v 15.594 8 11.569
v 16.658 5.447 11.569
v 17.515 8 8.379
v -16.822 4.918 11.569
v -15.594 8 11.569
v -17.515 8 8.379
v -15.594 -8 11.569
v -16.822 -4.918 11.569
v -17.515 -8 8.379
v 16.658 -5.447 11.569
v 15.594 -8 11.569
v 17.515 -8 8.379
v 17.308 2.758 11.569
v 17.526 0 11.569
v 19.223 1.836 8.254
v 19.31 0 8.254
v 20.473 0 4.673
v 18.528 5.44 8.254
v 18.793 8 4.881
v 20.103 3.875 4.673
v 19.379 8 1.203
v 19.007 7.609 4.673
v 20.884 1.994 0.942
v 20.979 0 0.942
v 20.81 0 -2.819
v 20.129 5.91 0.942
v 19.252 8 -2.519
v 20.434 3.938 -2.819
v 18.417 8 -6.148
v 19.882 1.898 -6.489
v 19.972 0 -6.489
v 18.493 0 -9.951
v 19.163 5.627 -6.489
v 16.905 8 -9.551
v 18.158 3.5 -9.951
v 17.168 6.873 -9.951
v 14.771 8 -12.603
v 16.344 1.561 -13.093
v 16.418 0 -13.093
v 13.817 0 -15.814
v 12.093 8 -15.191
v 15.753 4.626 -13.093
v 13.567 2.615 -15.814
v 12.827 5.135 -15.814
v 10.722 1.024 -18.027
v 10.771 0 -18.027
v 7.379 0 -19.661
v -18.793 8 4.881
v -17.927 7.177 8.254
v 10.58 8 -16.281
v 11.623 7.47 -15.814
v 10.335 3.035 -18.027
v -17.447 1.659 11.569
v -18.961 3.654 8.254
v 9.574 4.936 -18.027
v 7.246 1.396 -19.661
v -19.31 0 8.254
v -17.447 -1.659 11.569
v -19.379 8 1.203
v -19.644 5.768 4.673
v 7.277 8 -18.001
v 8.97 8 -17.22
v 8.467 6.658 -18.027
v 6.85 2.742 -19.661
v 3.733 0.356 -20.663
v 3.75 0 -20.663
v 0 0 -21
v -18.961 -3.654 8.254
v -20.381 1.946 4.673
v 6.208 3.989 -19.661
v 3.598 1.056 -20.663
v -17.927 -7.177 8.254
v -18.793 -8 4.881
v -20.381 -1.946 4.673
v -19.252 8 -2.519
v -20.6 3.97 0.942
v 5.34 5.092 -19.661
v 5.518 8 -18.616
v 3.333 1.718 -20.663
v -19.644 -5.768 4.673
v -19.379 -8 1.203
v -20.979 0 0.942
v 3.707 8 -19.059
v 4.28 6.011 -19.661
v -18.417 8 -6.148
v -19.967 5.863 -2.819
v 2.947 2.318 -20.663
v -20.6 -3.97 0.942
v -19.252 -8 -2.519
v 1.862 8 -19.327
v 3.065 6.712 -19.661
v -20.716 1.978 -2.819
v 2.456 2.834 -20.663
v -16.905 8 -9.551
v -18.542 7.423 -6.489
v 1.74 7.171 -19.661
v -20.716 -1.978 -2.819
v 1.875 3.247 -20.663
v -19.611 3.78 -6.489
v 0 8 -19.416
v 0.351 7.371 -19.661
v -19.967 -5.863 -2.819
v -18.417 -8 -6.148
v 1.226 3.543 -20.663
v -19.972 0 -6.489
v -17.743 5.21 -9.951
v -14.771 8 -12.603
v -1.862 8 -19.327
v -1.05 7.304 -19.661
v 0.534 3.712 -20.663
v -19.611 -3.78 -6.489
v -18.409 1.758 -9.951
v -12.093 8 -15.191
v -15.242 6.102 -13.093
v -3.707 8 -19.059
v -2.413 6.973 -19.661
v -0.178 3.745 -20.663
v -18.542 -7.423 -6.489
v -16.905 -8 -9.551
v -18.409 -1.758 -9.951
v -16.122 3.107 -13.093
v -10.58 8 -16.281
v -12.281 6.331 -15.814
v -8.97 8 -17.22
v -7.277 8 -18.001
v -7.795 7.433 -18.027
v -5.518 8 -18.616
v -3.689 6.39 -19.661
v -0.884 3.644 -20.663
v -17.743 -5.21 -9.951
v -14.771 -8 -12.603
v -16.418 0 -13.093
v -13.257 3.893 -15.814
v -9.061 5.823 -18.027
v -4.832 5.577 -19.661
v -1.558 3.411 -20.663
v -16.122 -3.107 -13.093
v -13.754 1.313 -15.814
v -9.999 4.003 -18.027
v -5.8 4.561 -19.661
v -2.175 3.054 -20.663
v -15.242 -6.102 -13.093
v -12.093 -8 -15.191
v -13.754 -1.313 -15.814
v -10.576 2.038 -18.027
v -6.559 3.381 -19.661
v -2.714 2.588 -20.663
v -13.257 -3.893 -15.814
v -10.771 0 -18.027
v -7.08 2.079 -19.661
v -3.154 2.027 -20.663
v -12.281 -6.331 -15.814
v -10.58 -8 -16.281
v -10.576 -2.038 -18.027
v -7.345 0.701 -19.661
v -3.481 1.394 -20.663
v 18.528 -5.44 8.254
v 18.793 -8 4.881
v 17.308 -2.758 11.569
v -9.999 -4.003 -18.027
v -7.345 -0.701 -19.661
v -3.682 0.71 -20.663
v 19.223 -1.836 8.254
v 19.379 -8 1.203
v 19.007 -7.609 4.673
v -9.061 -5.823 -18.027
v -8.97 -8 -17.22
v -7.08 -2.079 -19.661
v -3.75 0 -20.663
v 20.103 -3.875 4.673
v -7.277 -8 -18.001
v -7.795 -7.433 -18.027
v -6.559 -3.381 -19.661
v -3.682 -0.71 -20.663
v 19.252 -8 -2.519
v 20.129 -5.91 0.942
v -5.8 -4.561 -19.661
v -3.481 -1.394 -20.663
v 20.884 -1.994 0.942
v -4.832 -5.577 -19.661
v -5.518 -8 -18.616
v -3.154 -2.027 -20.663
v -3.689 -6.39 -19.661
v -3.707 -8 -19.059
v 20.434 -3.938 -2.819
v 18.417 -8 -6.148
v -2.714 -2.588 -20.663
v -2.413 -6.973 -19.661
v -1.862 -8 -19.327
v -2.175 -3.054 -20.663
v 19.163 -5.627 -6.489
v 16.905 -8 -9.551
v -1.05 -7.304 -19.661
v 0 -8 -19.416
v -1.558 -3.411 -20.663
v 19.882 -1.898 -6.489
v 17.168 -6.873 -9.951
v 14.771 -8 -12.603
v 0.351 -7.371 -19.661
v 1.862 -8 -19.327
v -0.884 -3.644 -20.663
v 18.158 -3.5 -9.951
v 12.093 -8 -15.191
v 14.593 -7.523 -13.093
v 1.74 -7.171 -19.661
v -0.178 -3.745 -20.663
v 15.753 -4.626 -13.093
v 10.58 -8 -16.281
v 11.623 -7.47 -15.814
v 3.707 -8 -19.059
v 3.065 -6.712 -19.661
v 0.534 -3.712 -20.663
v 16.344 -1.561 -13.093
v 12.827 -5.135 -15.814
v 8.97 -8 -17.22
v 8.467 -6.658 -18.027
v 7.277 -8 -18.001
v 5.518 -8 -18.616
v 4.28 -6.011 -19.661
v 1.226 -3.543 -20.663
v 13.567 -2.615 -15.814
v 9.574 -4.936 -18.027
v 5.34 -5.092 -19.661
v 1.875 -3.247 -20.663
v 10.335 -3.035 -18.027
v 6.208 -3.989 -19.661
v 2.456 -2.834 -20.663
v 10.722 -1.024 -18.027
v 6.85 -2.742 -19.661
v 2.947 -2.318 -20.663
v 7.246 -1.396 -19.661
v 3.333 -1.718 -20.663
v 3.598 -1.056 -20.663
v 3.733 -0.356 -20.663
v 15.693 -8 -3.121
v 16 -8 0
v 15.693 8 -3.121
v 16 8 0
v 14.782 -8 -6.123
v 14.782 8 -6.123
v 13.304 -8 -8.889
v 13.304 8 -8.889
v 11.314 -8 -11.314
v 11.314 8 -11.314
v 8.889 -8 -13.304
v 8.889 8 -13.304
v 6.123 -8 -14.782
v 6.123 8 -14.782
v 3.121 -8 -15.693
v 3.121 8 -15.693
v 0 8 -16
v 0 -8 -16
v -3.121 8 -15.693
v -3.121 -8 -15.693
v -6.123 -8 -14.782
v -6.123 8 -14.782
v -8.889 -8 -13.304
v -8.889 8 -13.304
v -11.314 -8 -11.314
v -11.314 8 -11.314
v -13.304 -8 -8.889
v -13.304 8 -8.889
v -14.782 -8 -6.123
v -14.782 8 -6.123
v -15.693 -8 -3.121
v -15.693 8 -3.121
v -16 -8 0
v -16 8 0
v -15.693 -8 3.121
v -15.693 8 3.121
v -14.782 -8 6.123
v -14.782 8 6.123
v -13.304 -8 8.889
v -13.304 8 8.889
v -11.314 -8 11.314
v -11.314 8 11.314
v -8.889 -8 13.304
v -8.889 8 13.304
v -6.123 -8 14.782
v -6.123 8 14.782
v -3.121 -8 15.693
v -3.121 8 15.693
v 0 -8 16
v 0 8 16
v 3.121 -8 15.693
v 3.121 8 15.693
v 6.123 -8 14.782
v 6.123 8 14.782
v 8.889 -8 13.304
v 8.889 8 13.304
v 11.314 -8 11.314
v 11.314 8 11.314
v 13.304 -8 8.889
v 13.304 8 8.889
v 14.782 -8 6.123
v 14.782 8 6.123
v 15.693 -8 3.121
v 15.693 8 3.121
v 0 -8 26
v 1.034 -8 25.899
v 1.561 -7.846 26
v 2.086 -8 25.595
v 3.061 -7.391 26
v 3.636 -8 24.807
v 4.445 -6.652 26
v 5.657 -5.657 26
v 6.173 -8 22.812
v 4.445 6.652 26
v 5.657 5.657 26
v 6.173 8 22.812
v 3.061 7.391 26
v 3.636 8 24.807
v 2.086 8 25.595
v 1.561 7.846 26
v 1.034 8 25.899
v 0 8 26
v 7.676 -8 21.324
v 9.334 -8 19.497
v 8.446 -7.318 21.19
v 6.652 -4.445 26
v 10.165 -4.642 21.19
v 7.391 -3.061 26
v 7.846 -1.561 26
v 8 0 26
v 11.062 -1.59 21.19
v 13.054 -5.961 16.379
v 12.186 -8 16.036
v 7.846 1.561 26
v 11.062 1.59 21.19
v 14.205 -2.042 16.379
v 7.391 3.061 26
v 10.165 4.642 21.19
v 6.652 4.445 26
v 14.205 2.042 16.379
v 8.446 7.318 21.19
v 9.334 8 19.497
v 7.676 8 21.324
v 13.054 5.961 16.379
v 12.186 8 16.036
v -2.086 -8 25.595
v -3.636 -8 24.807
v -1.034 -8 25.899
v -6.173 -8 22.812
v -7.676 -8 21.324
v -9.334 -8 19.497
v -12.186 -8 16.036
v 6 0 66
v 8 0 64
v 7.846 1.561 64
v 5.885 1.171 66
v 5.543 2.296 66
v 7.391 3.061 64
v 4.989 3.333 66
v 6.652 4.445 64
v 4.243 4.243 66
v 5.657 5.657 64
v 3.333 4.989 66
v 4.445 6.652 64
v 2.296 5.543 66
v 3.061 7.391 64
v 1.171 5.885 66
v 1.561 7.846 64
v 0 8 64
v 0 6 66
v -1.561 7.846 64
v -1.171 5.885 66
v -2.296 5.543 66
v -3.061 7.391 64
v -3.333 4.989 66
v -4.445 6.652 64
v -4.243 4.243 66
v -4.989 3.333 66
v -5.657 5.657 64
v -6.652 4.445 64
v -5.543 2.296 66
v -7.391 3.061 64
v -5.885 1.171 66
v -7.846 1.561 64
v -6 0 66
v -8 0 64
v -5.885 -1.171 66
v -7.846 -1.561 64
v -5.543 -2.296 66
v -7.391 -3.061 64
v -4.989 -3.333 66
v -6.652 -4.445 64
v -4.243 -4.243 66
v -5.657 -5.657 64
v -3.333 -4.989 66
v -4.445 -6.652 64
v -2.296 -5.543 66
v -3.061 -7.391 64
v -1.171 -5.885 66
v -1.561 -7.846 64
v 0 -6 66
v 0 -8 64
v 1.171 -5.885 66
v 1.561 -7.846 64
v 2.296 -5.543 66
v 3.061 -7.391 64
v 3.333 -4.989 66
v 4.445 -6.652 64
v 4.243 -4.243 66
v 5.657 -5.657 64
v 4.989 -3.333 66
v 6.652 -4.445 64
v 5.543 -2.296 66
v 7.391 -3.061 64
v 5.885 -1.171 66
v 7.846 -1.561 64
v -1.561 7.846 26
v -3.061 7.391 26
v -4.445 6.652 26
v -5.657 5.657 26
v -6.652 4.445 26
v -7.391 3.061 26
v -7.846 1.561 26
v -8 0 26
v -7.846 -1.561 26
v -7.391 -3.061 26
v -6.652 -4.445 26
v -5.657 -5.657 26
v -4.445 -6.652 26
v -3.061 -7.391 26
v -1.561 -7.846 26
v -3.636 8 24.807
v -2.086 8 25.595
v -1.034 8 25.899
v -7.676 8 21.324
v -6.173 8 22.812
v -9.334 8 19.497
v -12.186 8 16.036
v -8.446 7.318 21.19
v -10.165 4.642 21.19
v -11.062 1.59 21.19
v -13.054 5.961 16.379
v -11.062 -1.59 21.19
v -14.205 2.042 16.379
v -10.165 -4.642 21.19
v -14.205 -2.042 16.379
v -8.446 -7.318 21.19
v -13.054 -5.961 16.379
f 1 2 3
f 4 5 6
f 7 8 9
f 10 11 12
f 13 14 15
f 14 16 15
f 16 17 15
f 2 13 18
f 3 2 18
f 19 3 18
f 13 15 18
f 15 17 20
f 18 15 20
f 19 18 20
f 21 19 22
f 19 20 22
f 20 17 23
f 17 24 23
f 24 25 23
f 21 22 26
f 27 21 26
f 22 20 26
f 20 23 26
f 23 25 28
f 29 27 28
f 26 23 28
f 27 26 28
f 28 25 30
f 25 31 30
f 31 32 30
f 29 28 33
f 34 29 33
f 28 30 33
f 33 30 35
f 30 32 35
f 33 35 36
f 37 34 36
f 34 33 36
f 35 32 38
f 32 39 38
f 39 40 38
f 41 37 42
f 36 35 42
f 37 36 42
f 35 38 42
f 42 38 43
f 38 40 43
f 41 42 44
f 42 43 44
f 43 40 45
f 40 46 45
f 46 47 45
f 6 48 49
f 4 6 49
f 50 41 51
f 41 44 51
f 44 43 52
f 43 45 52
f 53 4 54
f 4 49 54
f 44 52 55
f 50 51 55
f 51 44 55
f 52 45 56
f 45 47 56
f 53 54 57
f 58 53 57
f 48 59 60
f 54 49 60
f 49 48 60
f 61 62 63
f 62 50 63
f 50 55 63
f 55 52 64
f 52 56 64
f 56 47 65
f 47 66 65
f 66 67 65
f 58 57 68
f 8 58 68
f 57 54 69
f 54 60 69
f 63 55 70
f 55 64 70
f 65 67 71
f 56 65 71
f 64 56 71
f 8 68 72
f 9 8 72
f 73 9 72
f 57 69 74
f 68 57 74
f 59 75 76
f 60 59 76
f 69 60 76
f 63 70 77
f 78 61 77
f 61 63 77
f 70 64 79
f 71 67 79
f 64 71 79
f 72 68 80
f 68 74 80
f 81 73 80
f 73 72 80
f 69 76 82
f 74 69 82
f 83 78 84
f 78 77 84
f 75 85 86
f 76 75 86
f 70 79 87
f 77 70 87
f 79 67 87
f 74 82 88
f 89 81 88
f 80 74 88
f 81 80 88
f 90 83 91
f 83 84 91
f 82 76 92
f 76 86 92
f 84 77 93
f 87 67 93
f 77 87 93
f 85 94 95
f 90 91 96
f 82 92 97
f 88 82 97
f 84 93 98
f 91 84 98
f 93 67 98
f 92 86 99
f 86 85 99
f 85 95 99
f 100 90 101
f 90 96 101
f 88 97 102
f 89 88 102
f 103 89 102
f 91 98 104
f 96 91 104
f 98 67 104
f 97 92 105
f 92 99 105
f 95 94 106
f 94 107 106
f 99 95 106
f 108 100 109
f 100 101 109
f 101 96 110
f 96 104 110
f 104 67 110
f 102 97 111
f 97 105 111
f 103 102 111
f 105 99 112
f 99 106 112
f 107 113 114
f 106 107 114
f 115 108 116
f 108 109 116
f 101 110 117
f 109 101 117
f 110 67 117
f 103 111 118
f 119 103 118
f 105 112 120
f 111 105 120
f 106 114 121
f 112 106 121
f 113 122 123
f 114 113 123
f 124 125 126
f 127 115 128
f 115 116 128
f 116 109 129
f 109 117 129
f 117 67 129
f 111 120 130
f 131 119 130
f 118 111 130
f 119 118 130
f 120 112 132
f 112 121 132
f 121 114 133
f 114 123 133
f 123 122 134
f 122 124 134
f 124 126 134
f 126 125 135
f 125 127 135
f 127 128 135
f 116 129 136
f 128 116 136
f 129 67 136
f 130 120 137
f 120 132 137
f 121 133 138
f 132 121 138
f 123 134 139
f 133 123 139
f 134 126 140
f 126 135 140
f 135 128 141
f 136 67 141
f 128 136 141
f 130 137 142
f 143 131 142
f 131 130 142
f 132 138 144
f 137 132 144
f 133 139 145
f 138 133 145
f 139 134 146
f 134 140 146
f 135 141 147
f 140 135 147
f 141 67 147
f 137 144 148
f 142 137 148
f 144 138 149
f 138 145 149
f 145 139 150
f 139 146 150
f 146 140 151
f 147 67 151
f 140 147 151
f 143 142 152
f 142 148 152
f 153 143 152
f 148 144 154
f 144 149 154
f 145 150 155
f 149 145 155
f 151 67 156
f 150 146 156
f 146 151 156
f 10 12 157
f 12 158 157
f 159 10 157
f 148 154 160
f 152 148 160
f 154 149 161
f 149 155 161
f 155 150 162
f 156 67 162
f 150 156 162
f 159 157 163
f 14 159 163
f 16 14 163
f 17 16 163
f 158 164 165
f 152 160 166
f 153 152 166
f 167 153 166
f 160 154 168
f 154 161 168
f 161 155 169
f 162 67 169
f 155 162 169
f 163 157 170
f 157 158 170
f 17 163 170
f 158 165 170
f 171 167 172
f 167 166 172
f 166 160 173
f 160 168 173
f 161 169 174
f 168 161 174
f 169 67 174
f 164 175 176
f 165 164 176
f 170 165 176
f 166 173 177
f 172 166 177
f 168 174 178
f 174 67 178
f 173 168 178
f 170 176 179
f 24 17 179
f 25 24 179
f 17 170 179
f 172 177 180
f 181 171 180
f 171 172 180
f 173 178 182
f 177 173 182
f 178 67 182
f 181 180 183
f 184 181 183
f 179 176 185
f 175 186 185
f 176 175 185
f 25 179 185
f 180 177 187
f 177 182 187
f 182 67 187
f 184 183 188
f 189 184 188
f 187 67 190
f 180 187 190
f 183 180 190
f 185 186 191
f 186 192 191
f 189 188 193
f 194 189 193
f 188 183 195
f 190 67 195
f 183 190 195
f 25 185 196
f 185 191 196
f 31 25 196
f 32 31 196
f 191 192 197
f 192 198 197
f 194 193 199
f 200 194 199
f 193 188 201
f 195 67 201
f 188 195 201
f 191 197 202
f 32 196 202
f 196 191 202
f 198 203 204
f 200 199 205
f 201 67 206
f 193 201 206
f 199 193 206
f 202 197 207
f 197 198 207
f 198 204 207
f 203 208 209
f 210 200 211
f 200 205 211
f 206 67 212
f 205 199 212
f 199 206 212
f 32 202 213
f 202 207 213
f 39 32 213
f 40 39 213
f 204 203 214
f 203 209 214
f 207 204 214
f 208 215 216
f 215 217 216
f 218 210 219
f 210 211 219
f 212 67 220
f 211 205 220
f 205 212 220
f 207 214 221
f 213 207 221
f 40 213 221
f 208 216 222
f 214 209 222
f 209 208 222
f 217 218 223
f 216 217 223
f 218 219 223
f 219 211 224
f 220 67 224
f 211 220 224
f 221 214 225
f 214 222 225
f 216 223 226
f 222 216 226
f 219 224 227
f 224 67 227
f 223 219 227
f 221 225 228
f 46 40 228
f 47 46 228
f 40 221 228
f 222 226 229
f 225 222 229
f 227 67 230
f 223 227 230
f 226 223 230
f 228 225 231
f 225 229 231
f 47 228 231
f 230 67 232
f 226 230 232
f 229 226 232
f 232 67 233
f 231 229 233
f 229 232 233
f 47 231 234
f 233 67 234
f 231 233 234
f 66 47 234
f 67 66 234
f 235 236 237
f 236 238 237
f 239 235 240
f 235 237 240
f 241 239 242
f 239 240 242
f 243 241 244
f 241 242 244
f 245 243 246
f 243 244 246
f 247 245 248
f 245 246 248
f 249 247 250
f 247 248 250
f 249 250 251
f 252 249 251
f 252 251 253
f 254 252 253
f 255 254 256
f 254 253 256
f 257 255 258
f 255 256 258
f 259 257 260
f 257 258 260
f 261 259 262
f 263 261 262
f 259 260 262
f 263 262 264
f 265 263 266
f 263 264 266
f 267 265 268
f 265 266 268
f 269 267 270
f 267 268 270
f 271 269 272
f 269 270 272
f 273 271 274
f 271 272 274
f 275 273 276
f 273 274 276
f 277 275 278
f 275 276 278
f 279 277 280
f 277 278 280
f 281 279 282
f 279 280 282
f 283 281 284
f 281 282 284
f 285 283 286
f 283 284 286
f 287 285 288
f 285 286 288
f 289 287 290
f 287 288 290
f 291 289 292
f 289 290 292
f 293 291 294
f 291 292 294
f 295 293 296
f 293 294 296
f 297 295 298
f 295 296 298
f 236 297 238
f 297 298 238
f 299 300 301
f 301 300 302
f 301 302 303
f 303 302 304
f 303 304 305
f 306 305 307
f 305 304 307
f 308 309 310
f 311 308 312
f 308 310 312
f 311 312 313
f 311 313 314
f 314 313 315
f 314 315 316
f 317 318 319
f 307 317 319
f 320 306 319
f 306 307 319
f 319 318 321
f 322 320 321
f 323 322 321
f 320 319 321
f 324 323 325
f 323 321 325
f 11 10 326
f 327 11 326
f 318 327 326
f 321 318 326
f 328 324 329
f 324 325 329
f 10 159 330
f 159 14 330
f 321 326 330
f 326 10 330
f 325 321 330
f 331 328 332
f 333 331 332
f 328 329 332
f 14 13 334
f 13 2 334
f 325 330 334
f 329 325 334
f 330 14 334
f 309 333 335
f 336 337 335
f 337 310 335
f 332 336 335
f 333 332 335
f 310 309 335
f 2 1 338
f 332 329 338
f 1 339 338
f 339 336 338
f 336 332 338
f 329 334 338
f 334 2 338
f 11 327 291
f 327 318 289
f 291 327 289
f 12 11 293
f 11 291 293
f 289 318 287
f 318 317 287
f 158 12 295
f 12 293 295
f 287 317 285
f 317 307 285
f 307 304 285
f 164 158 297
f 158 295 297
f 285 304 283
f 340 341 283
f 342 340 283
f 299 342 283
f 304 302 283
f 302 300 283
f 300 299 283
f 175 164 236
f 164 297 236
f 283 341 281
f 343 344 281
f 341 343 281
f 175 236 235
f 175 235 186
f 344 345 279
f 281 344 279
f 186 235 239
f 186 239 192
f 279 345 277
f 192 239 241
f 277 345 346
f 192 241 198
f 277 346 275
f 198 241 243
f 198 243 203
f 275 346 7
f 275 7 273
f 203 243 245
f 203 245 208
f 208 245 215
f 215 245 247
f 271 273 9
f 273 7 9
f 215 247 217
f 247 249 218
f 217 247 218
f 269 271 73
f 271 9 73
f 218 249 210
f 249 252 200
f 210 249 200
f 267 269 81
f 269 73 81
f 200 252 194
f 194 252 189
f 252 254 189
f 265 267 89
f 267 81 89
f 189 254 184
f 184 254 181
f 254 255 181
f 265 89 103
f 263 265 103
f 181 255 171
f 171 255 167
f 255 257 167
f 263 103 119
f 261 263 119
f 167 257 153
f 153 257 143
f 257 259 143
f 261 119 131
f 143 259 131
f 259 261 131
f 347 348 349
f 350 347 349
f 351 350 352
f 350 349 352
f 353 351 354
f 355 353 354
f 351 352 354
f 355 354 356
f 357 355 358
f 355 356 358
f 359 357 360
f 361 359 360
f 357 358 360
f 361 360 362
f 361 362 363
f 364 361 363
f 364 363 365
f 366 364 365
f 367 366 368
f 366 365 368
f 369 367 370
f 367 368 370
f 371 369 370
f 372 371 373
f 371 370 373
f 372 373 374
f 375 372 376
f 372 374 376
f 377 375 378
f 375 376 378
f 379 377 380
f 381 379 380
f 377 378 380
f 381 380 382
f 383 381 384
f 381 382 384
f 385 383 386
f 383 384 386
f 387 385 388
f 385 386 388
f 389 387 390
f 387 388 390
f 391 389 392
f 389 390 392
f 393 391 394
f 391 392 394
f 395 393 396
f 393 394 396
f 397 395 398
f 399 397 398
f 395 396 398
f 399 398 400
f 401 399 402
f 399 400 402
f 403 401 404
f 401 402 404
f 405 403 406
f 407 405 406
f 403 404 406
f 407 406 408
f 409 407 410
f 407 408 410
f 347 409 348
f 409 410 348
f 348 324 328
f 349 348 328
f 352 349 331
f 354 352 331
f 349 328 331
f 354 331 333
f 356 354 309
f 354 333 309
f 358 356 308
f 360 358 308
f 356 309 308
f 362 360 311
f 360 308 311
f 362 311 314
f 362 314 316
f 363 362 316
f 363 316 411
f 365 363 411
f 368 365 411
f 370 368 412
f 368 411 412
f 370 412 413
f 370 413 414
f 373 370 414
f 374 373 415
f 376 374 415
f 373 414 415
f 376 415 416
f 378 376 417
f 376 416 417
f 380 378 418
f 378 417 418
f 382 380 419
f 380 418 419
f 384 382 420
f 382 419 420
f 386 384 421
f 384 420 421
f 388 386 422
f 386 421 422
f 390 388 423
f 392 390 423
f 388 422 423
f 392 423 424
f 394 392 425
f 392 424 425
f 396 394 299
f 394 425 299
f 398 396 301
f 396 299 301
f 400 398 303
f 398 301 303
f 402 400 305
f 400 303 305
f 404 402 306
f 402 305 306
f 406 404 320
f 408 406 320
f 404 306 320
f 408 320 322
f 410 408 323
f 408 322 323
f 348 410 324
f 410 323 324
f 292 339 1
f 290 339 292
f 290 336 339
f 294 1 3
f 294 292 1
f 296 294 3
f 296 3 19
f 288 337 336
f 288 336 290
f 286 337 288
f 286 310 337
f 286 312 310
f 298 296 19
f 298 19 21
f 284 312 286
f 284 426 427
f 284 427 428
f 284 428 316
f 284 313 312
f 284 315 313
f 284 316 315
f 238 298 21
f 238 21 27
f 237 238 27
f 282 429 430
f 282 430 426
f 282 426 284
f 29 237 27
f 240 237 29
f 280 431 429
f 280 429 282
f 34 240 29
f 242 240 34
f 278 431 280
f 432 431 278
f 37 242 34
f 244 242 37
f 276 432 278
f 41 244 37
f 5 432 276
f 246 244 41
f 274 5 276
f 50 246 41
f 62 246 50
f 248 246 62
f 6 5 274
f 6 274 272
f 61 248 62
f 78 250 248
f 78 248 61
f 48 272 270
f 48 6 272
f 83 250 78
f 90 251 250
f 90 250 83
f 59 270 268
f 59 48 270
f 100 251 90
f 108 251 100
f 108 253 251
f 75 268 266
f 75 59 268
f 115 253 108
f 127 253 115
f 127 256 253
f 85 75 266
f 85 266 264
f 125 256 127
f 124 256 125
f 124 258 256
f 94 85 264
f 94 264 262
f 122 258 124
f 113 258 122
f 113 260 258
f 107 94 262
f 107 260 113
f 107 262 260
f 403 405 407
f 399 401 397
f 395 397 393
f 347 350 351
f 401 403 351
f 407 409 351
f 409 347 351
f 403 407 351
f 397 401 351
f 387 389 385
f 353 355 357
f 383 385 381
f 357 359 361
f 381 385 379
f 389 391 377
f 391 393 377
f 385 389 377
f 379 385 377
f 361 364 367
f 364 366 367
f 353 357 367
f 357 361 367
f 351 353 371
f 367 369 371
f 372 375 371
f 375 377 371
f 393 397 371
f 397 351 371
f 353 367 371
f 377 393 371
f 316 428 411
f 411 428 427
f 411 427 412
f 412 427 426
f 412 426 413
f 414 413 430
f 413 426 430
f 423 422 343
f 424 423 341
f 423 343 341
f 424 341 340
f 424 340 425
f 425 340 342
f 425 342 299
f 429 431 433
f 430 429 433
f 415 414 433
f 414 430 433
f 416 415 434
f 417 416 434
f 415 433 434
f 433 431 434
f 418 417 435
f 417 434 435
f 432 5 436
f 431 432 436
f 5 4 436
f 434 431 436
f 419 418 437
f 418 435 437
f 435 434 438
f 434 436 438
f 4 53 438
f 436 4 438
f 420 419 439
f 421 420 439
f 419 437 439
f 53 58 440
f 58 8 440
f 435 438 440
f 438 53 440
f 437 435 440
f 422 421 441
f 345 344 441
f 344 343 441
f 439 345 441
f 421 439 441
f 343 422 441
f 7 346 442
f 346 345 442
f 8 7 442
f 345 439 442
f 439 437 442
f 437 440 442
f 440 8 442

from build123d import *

# Parameters (mm, degrees)
SZKIC1_W                        = 8
SZKIC1_H                        = 40
WYTNIJ_WYCI_GNI_CIE1_DEPTH      = 22
WYTNIJ_WYCI_GNI_CIE1_DEPTH_BACK = 22
SZKIC3_R                        = 16
WYTNIJ_WYCI_GNI_CIE2_DEPTH      = 9
WYTNIJ_WYCI_GNI_CIE2_DEPTH_BACK = 9
SFAZOWANIE1_SIZE                = 2


with BuildPart() as part:
    # Szkic1 → Obrót1 (revolve)
    with BuildSketch(Plane(origin=(0, 0, 0), x_dir=(1, 0, 0), z_dir=(0, 1, 0))):
        with BuildLine():
            Line((0, 21), (0, -26))
            Line((0, -26), (8, -26))
            Line((8, -26), (17.525976473, -11.568930316))
            ThreePointArc((17.525976473, -11.568930316), (18.492532772, 9.951192475), (0, 21))
        make_face()
        with Locations((4, -46)):
            Rectangle(SZKIC1_W, SZKIC1_H)
    revolve(axis=Axis((0, 0, -26.043516498), (0, 0, 1)))

    # Szkic2 → Wytnij-wyciągnięcie1 (cut, two sides)
    with BuildSketch(Plane(origin=(0, 0, 0), x_dir=(0, 0, -1), z_dir=(1, 0, 0))) as wytnij_wyci_gni_cie1_sk:
        with BuildLine():
            Line((-26, 8), (19.416487839, 8))
            ThreePointArc((19.416487839, 8), (6.171069333, 20.072815031), (-11.568930316, 17.525976473))
            Line((-11.568930316, 17.525976473), (-26, 8))
        make_face()
        with BuildLine():
            Line((-26, -8), (19.416487839, -8))
            ThreePointArc((19.416487839, -8), (6.171069333, -20.072815031), (-11.568930316, -17.525976473))
            Line((-11.568930316, -17.525976473), (-26, -8))
        make_face()
    extrude(amount=WYTNIJ_WYCI_GNI_CIE1_DEPTH, mode=Mode.SUBTRACT)
    extrude(wytnij_wyci_gni_cie1_sk.sketch, amount=-WYTNIJ_WYCI_GNI_CIE1_DEPTH_BACK, mode=Mode.SUBTRACT)

    # Szkic3 → Wytnij-wyciągnięcie2 (cut, two sides)
    with BuildSketch(Plane(origin=(0, 0, 0), x_dir=(1, 0, 0), z_dir=(0, 1, 0))) as wytnij_wyci_gni_cie2_sk:
        Circle(SZKIC3_R)
    extrude(amount=WYTNIJ_WYCI_GNI_CIE2_DEPTH, mode=Mode.SUBTRACT)
    extrude(wytnij_wyci_gni_cie2_sk.sketch, amount=-WYTNIJ_WYCI_GNI_CIE2_DEPTH_BACK, mode=Mode.SUBTRACT)

    # Sfazowanie1
    sfazowanie1_edges = [part.edges().sort_by_distance(p)[0] for p in [
        (-8, 0, 66),
    ]]
    chamfer(sfazowanie1_edges, length=SFAZOWANIE1_SIZE)


solid = part.part
